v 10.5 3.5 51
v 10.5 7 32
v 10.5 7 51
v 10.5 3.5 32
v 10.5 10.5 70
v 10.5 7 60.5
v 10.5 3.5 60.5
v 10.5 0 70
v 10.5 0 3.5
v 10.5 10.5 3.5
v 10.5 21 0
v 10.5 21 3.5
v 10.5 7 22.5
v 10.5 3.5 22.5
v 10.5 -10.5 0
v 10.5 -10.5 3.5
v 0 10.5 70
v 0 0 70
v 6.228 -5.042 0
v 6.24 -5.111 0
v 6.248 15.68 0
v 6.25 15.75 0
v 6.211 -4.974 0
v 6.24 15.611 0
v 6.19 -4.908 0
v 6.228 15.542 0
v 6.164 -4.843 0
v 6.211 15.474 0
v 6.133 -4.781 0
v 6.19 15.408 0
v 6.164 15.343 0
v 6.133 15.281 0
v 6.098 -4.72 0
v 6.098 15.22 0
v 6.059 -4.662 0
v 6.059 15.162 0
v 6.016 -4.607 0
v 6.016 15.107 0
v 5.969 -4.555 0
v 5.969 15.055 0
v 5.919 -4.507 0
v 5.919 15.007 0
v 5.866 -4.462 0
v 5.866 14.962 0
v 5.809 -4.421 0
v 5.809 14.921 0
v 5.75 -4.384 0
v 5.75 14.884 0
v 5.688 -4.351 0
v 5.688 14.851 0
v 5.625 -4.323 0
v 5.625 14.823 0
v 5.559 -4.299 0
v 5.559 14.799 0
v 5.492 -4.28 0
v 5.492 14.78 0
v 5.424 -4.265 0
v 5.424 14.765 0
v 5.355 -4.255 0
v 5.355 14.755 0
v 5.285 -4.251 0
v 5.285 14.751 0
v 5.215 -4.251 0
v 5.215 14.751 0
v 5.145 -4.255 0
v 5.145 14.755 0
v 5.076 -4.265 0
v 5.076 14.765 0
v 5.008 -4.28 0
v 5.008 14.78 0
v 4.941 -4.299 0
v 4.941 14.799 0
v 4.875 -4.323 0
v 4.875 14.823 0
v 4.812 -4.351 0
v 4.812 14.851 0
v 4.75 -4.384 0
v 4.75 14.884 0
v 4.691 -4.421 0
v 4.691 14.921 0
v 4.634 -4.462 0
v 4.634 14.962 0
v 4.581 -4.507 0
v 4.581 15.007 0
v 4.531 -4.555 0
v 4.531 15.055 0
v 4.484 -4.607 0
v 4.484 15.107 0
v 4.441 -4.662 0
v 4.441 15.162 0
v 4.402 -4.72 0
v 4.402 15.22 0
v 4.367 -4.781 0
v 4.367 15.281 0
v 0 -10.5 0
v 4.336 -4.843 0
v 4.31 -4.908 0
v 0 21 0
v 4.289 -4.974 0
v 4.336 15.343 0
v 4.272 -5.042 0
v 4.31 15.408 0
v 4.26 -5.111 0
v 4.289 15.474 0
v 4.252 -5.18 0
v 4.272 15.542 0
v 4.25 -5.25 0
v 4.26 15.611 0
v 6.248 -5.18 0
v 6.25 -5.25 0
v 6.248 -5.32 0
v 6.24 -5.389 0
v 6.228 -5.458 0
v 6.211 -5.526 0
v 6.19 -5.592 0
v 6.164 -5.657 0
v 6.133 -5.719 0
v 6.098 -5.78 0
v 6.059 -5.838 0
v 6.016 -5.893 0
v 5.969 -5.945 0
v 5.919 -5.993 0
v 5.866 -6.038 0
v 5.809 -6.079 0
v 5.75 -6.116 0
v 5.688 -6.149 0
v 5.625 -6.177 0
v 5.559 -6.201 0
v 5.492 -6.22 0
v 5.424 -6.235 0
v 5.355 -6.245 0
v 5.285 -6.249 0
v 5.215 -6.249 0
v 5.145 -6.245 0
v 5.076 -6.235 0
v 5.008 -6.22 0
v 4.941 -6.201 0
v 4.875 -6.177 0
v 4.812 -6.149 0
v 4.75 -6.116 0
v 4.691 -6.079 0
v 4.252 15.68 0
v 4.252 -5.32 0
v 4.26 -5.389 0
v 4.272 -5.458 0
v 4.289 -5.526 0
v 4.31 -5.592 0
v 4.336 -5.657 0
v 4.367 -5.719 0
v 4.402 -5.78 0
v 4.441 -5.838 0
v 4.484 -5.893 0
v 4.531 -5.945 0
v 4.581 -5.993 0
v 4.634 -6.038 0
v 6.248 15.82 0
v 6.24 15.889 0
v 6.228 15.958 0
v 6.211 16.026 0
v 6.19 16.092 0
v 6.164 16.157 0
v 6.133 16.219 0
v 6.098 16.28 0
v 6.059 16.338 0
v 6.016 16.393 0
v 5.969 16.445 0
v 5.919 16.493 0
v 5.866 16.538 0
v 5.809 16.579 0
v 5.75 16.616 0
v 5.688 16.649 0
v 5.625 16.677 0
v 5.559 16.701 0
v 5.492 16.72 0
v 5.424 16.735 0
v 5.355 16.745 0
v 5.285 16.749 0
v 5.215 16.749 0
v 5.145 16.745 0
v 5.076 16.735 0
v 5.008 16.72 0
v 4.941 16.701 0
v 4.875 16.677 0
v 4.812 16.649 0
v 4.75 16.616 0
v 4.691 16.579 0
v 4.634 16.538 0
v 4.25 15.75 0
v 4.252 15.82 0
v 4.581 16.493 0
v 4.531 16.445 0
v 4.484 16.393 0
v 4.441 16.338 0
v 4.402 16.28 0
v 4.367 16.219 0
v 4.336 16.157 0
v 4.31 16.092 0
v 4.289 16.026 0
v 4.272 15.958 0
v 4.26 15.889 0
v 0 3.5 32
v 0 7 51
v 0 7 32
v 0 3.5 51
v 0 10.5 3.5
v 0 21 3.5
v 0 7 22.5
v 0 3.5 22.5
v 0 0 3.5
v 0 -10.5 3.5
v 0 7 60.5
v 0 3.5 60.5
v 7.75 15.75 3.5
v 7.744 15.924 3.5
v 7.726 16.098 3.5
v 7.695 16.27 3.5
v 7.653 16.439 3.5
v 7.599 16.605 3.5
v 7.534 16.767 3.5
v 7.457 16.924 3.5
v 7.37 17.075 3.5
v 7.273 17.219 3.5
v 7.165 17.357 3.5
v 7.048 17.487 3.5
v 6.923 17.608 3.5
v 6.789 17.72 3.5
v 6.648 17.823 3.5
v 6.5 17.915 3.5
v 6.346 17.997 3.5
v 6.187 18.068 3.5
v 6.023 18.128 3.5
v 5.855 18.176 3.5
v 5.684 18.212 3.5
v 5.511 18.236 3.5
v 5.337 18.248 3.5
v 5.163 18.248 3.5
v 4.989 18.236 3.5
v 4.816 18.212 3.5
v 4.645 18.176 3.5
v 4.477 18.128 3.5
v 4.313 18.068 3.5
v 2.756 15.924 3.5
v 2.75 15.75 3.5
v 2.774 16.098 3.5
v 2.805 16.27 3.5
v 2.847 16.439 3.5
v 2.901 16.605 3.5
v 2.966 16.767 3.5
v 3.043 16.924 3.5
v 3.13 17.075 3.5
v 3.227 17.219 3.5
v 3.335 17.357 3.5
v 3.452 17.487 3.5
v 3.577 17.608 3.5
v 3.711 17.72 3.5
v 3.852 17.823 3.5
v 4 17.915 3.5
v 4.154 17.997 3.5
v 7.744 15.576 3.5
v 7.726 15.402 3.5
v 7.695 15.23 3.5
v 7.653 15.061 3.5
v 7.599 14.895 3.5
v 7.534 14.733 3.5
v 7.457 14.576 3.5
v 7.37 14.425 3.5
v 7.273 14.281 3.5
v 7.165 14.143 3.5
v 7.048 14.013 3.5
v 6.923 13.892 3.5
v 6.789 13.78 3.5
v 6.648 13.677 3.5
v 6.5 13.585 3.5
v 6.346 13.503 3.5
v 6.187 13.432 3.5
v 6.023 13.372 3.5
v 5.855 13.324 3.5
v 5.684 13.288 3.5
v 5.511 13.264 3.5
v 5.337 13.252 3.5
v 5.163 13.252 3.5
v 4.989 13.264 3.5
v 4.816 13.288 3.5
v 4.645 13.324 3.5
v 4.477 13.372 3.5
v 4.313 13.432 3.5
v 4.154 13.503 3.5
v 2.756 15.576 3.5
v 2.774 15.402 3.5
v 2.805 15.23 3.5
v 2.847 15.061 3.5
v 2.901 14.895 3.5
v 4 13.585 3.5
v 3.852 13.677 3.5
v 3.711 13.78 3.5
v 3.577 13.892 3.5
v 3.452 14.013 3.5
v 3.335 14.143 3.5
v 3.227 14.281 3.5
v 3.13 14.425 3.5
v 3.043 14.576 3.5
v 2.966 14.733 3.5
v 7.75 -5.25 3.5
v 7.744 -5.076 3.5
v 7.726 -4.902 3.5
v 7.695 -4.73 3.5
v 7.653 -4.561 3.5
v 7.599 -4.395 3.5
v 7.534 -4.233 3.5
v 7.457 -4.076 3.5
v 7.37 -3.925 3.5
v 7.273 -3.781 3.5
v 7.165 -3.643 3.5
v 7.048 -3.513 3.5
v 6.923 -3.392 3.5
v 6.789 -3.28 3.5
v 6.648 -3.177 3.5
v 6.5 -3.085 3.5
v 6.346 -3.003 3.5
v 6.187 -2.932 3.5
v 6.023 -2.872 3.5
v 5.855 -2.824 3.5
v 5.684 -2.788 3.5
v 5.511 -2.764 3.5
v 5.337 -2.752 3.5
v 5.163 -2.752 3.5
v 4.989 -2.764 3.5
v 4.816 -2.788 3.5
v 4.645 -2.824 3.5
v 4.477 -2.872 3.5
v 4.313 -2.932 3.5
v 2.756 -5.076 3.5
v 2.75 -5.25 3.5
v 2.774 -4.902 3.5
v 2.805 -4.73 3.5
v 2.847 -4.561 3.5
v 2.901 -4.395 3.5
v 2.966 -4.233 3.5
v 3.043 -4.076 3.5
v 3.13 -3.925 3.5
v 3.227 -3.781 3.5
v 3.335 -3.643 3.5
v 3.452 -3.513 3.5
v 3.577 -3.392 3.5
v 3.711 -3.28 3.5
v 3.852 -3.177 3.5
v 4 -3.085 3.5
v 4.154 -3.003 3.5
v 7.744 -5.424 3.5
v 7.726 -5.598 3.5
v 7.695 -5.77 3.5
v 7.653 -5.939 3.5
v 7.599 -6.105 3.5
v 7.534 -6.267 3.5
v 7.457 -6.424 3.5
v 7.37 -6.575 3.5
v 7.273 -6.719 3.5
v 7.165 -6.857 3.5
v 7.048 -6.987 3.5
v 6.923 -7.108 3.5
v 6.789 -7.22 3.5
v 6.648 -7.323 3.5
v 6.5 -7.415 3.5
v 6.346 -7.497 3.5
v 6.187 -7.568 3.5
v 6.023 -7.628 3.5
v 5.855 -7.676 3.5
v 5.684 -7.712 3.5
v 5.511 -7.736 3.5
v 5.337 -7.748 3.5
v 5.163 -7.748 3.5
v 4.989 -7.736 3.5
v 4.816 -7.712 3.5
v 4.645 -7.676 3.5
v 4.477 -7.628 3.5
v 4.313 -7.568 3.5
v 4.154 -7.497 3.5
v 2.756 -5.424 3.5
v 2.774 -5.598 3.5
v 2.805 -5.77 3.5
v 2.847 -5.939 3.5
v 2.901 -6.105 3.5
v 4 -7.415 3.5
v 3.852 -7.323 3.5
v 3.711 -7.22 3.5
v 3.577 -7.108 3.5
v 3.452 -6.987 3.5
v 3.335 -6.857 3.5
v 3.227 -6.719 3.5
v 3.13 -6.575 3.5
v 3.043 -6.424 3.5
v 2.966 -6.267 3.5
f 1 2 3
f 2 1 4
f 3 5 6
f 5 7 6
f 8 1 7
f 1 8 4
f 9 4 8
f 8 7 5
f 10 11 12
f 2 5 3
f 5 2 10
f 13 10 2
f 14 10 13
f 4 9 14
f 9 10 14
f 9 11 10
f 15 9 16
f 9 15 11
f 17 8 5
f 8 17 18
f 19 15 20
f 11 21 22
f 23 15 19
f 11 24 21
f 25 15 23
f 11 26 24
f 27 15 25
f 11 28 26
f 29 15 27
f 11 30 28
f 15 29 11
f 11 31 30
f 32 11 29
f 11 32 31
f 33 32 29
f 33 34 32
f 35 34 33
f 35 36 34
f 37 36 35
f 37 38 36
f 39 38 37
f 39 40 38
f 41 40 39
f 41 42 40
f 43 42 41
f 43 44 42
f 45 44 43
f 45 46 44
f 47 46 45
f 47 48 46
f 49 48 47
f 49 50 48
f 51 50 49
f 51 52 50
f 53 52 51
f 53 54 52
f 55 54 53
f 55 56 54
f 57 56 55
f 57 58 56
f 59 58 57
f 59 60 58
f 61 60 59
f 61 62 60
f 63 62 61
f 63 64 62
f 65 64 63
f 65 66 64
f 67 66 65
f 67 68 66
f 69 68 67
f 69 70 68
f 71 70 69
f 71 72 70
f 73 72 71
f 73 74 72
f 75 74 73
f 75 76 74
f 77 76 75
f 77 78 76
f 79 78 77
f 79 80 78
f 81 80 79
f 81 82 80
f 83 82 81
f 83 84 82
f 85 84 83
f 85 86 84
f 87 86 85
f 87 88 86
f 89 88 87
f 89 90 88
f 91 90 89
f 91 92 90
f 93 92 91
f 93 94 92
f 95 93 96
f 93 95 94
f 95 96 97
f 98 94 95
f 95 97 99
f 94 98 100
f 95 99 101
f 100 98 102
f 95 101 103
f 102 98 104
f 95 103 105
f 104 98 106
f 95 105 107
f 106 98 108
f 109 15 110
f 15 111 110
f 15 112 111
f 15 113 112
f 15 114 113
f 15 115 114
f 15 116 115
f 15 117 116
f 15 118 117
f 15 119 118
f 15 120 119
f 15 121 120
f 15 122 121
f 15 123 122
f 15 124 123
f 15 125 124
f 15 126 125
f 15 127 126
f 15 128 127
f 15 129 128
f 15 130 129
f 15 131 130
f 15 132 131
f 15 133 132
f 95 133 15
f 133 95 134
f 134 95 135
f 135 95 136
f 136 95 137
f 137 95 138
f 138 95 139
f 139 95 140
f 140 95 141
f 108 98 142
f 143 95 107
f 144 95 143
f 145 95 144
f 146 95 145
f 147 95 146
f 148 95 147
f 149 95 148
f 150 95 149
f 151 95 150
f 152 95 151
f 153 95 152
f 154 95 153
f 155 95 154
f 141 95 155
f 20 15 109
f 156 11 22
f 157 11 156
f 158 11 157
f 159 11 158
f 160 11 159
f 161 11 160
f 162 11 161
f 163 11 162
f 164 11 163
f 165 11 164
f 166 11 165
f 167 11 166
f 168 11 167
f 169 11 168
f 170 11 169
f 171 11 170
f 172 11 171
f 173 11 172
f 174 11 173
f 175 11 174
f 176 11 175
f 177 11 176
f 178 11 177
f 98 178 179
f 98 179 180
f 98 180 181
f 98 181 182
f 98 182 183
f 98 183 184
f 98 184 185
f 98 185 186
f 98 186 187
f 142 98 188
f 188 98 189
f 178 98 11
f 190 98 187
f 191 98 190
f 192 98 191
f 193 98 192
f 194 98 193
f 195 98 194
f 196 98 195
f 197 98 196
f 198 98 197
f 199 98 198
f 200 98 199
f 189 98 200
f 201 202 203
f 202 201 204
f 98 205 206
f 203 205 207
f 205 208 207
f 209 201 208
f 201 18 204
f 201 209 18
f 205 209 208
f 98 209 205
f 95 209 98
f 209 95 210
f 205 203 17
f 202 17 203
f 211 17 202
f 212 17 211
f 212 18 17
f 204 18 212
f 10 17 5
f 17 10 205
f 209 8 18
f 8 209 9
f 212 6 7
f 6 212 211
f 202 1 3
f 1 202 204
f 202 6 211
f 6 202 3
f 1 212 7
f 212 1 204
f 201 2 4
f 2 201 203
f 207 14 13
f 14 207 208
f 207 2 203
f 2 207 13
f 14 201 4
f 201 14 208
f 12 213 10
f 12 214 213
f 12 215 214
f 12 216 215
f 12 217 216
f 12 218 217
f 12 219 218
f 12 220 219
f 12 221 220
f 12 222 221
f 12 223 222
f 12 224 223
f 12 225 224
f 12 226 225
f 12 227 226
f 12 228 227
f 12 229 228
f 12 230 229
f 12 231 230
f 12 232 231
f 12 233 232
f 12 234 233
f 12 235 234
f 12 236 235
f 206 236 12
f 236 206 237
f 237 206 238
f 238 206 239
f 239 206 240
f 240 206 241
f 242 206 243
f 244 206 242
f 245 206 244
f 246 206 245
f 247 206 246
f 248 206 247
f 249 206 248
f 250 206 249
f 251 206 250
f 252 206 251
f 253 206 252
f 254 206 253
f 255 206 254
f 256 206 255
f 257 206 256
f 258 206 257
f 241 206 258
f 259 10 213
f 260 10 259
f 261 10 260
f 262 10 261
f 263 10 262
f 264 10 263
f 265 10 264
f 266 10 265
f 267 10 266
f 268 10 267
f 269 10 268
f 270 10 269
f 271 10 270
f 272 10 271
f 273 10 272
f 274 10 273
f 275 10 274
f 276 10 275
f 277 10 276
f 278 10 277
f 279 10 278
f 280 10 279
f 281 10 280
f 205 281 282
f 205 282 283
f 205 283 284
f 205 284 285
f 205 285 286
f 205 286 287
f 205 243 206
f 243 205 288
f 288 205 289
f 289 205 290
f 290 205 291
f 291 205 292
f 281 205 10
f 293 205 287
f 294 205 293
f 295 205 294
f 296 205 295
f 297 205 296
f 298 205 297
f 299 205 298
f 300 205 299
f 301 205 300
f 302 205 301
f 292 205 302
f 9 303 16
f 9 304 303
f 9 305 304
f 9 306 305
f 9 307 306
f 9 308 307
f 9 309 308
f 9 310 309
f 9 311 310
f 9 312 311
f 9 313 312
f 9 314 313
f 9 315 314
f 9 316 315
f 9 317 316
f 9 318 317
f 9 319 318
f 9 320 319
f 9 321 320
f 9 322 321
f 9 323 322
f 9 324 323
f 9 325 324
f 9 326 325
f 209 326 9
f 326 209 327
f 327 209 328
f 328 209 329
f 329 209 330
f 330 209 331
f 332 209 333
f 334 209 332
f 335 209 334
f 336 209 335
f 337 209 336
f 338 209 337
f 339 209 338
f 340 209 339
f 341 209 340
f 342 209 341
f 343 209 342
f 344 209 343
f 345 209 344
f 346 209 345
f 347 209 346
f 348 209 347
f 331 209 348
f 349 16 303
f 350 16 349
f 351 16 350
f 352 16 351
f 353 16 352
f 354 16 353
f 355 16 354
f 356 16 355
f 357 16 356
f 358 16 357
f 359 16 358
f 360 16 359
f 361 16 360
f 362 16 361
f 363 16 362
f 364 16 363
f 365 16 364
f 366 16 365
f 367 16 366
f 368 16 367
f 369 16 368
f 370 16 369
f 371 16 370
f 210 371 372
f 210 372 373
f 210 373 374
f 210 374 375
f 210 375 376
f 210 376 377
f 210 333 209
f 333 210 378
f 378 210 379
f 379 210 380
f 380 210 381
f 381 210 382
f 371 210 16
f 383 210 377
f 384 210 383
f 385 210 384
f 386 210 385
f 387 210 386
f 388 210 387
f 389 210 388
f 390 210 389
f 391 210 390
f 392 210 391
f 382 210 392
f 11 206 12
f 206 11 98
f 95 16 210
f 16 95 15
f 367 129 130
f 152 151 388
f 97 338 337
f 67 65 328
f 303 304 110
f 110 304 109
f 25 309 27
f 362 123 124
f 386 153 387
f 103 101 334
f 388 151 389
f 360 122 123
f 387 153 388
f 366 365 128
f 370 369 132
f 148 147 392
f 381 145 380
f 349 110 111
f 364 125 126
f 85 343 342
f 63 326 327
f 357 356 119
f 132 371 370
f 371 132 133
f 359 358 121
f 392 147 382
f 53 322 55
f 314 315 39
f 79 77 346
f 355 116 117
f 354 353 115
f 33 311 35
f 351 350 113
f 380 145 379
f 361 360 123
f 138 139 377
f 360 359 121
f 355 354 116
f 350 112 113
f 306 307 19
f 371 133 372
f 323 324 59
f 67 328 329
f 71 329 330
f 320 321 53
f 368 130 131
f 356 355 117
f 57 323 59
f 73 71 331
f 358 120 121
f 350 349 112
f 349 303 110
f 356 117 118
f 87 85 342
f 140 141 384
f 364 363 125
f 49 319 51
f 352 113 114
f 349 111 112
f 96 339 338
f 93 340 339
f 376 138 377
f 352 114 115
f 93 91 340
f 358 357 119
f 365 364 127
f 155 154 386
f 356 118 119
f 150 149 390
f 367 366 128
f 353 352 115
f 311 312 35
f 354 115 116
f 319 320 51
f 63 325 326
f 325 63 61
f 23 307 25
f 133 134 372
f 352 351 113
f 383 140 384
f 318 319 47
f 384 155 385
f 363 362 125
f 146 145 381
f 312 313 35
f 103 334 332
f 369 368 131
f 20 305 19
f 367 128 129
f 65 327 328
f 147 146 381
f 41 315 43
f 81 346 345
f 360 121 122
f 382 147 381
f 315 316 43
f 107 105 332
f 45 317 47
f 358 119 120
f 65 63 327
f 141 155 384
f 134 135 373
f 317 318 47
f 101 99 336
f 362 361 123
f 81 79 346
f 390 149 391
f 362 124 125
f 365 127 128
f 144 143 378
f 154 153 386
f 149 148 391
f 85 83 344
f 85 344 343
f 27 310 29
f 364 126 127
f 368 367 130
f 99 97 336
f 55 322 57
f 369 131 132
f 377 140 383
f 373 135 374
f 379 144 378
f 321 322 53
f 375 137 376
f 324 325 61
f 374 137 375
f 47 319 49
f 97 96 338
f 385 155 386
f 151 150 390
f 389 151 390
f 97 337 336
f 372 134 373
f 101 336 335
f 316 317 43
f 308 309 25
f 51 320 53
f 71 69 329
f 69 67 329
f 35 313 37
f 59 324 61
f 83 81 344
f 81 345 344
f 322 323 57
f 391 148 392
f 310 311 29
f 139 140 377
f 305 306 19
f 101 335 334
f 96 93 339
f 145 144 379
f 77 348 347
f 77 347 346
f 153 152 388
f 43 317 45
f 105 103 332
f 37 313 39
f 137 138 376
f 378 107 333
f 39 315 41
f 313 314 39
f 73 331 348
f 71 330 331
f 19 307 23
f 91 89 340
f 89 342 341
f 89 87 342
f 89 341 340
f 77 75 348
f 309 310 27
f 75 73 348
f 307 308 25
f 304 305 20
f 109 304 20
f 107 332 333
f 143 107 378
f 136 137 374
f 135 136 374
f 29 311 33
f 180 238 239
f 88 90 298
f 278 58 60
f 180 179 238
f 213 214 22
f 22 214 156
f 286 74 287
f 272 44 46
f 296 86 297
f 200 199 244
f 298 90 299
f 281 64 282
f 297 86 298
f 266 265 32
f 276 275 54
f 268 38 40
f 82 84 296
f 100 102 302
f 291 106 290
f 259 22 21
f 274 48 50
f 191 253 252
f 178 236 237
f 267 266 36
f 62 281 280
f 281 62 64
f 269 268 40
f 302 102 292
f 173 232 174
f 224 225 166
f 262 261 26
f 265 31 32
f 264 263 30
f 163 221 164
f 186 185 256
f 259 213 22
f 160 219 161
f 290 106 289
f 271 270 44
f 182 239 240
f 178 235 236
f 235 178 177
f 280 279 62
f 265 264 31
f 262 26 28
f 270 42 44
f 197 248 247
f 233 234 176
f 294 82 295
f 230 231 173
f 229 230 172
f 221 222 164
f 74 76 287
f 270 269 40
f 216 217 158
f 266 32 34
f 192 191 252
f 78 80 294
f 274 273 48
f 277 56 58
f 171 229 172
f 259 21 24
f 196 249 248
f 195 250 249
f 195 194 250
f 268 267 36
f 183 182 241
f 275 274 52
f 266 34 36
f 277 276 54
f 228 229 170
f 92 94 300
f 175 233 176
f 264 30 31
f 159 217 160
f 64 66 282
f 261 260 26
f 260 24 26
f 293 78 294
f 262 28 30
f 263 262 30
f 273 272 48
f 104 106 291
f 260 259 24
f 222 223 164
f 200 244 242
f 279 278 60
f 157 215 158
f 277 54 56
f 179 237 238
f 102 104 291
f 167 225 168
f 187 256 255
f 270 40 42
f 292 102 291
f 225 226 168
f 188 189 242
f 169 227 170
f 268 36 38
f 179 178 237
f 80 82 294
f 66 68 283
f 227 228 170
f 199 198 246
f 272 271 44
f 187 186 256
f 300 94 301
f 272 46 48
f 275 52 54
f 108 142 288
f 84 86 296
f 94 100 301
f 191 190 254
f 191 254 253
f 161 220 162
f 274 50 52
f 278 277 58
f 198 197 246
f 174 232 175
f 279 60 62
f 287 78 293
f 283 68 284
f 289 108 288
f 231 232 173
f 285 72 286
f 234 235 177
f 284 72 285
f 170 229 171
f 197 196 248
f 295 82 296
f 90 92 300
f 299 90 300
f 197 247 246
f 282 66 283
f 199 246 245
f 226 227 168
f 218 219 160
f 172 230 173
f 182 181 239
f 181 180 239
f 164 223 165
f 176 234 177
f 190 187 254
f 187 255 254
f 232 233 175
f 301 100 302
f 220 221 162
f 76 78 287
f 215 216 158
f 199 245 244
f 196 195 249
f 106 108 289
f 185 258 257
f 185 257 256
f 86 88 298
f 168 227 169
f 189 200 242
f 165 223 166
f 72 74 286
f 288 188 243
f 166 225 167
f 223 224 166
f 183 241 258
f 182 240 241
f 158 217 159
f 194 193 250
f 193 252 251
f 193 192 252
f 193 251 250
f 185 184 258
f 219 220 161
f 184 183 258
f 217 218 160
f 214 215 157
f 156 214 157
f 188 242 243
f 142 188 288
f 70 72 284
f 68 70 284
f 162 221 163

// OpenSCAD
a=400;
b=3.5;
c=9.5;
d=70;
sk=5;

$fn=90;

difference() {
cube([b*3, b*3, d]);

translate([0,b,d-c*2])
cube([a, b, c]);

translate([0,b,d-c*5])
cube([a, b, c]);
}

difference() {
translate([0,-b*3,0])
cube([b*3,b*9,b]);

translate([b*3/2,-b*3/2,0])
color("red")
cylinder(h=b, d1=2, d2=sk);

translate([b*3/2,b*3*1.5,0])
color("red")
cylinder(h=b, d1=2, d2=sk);
}
